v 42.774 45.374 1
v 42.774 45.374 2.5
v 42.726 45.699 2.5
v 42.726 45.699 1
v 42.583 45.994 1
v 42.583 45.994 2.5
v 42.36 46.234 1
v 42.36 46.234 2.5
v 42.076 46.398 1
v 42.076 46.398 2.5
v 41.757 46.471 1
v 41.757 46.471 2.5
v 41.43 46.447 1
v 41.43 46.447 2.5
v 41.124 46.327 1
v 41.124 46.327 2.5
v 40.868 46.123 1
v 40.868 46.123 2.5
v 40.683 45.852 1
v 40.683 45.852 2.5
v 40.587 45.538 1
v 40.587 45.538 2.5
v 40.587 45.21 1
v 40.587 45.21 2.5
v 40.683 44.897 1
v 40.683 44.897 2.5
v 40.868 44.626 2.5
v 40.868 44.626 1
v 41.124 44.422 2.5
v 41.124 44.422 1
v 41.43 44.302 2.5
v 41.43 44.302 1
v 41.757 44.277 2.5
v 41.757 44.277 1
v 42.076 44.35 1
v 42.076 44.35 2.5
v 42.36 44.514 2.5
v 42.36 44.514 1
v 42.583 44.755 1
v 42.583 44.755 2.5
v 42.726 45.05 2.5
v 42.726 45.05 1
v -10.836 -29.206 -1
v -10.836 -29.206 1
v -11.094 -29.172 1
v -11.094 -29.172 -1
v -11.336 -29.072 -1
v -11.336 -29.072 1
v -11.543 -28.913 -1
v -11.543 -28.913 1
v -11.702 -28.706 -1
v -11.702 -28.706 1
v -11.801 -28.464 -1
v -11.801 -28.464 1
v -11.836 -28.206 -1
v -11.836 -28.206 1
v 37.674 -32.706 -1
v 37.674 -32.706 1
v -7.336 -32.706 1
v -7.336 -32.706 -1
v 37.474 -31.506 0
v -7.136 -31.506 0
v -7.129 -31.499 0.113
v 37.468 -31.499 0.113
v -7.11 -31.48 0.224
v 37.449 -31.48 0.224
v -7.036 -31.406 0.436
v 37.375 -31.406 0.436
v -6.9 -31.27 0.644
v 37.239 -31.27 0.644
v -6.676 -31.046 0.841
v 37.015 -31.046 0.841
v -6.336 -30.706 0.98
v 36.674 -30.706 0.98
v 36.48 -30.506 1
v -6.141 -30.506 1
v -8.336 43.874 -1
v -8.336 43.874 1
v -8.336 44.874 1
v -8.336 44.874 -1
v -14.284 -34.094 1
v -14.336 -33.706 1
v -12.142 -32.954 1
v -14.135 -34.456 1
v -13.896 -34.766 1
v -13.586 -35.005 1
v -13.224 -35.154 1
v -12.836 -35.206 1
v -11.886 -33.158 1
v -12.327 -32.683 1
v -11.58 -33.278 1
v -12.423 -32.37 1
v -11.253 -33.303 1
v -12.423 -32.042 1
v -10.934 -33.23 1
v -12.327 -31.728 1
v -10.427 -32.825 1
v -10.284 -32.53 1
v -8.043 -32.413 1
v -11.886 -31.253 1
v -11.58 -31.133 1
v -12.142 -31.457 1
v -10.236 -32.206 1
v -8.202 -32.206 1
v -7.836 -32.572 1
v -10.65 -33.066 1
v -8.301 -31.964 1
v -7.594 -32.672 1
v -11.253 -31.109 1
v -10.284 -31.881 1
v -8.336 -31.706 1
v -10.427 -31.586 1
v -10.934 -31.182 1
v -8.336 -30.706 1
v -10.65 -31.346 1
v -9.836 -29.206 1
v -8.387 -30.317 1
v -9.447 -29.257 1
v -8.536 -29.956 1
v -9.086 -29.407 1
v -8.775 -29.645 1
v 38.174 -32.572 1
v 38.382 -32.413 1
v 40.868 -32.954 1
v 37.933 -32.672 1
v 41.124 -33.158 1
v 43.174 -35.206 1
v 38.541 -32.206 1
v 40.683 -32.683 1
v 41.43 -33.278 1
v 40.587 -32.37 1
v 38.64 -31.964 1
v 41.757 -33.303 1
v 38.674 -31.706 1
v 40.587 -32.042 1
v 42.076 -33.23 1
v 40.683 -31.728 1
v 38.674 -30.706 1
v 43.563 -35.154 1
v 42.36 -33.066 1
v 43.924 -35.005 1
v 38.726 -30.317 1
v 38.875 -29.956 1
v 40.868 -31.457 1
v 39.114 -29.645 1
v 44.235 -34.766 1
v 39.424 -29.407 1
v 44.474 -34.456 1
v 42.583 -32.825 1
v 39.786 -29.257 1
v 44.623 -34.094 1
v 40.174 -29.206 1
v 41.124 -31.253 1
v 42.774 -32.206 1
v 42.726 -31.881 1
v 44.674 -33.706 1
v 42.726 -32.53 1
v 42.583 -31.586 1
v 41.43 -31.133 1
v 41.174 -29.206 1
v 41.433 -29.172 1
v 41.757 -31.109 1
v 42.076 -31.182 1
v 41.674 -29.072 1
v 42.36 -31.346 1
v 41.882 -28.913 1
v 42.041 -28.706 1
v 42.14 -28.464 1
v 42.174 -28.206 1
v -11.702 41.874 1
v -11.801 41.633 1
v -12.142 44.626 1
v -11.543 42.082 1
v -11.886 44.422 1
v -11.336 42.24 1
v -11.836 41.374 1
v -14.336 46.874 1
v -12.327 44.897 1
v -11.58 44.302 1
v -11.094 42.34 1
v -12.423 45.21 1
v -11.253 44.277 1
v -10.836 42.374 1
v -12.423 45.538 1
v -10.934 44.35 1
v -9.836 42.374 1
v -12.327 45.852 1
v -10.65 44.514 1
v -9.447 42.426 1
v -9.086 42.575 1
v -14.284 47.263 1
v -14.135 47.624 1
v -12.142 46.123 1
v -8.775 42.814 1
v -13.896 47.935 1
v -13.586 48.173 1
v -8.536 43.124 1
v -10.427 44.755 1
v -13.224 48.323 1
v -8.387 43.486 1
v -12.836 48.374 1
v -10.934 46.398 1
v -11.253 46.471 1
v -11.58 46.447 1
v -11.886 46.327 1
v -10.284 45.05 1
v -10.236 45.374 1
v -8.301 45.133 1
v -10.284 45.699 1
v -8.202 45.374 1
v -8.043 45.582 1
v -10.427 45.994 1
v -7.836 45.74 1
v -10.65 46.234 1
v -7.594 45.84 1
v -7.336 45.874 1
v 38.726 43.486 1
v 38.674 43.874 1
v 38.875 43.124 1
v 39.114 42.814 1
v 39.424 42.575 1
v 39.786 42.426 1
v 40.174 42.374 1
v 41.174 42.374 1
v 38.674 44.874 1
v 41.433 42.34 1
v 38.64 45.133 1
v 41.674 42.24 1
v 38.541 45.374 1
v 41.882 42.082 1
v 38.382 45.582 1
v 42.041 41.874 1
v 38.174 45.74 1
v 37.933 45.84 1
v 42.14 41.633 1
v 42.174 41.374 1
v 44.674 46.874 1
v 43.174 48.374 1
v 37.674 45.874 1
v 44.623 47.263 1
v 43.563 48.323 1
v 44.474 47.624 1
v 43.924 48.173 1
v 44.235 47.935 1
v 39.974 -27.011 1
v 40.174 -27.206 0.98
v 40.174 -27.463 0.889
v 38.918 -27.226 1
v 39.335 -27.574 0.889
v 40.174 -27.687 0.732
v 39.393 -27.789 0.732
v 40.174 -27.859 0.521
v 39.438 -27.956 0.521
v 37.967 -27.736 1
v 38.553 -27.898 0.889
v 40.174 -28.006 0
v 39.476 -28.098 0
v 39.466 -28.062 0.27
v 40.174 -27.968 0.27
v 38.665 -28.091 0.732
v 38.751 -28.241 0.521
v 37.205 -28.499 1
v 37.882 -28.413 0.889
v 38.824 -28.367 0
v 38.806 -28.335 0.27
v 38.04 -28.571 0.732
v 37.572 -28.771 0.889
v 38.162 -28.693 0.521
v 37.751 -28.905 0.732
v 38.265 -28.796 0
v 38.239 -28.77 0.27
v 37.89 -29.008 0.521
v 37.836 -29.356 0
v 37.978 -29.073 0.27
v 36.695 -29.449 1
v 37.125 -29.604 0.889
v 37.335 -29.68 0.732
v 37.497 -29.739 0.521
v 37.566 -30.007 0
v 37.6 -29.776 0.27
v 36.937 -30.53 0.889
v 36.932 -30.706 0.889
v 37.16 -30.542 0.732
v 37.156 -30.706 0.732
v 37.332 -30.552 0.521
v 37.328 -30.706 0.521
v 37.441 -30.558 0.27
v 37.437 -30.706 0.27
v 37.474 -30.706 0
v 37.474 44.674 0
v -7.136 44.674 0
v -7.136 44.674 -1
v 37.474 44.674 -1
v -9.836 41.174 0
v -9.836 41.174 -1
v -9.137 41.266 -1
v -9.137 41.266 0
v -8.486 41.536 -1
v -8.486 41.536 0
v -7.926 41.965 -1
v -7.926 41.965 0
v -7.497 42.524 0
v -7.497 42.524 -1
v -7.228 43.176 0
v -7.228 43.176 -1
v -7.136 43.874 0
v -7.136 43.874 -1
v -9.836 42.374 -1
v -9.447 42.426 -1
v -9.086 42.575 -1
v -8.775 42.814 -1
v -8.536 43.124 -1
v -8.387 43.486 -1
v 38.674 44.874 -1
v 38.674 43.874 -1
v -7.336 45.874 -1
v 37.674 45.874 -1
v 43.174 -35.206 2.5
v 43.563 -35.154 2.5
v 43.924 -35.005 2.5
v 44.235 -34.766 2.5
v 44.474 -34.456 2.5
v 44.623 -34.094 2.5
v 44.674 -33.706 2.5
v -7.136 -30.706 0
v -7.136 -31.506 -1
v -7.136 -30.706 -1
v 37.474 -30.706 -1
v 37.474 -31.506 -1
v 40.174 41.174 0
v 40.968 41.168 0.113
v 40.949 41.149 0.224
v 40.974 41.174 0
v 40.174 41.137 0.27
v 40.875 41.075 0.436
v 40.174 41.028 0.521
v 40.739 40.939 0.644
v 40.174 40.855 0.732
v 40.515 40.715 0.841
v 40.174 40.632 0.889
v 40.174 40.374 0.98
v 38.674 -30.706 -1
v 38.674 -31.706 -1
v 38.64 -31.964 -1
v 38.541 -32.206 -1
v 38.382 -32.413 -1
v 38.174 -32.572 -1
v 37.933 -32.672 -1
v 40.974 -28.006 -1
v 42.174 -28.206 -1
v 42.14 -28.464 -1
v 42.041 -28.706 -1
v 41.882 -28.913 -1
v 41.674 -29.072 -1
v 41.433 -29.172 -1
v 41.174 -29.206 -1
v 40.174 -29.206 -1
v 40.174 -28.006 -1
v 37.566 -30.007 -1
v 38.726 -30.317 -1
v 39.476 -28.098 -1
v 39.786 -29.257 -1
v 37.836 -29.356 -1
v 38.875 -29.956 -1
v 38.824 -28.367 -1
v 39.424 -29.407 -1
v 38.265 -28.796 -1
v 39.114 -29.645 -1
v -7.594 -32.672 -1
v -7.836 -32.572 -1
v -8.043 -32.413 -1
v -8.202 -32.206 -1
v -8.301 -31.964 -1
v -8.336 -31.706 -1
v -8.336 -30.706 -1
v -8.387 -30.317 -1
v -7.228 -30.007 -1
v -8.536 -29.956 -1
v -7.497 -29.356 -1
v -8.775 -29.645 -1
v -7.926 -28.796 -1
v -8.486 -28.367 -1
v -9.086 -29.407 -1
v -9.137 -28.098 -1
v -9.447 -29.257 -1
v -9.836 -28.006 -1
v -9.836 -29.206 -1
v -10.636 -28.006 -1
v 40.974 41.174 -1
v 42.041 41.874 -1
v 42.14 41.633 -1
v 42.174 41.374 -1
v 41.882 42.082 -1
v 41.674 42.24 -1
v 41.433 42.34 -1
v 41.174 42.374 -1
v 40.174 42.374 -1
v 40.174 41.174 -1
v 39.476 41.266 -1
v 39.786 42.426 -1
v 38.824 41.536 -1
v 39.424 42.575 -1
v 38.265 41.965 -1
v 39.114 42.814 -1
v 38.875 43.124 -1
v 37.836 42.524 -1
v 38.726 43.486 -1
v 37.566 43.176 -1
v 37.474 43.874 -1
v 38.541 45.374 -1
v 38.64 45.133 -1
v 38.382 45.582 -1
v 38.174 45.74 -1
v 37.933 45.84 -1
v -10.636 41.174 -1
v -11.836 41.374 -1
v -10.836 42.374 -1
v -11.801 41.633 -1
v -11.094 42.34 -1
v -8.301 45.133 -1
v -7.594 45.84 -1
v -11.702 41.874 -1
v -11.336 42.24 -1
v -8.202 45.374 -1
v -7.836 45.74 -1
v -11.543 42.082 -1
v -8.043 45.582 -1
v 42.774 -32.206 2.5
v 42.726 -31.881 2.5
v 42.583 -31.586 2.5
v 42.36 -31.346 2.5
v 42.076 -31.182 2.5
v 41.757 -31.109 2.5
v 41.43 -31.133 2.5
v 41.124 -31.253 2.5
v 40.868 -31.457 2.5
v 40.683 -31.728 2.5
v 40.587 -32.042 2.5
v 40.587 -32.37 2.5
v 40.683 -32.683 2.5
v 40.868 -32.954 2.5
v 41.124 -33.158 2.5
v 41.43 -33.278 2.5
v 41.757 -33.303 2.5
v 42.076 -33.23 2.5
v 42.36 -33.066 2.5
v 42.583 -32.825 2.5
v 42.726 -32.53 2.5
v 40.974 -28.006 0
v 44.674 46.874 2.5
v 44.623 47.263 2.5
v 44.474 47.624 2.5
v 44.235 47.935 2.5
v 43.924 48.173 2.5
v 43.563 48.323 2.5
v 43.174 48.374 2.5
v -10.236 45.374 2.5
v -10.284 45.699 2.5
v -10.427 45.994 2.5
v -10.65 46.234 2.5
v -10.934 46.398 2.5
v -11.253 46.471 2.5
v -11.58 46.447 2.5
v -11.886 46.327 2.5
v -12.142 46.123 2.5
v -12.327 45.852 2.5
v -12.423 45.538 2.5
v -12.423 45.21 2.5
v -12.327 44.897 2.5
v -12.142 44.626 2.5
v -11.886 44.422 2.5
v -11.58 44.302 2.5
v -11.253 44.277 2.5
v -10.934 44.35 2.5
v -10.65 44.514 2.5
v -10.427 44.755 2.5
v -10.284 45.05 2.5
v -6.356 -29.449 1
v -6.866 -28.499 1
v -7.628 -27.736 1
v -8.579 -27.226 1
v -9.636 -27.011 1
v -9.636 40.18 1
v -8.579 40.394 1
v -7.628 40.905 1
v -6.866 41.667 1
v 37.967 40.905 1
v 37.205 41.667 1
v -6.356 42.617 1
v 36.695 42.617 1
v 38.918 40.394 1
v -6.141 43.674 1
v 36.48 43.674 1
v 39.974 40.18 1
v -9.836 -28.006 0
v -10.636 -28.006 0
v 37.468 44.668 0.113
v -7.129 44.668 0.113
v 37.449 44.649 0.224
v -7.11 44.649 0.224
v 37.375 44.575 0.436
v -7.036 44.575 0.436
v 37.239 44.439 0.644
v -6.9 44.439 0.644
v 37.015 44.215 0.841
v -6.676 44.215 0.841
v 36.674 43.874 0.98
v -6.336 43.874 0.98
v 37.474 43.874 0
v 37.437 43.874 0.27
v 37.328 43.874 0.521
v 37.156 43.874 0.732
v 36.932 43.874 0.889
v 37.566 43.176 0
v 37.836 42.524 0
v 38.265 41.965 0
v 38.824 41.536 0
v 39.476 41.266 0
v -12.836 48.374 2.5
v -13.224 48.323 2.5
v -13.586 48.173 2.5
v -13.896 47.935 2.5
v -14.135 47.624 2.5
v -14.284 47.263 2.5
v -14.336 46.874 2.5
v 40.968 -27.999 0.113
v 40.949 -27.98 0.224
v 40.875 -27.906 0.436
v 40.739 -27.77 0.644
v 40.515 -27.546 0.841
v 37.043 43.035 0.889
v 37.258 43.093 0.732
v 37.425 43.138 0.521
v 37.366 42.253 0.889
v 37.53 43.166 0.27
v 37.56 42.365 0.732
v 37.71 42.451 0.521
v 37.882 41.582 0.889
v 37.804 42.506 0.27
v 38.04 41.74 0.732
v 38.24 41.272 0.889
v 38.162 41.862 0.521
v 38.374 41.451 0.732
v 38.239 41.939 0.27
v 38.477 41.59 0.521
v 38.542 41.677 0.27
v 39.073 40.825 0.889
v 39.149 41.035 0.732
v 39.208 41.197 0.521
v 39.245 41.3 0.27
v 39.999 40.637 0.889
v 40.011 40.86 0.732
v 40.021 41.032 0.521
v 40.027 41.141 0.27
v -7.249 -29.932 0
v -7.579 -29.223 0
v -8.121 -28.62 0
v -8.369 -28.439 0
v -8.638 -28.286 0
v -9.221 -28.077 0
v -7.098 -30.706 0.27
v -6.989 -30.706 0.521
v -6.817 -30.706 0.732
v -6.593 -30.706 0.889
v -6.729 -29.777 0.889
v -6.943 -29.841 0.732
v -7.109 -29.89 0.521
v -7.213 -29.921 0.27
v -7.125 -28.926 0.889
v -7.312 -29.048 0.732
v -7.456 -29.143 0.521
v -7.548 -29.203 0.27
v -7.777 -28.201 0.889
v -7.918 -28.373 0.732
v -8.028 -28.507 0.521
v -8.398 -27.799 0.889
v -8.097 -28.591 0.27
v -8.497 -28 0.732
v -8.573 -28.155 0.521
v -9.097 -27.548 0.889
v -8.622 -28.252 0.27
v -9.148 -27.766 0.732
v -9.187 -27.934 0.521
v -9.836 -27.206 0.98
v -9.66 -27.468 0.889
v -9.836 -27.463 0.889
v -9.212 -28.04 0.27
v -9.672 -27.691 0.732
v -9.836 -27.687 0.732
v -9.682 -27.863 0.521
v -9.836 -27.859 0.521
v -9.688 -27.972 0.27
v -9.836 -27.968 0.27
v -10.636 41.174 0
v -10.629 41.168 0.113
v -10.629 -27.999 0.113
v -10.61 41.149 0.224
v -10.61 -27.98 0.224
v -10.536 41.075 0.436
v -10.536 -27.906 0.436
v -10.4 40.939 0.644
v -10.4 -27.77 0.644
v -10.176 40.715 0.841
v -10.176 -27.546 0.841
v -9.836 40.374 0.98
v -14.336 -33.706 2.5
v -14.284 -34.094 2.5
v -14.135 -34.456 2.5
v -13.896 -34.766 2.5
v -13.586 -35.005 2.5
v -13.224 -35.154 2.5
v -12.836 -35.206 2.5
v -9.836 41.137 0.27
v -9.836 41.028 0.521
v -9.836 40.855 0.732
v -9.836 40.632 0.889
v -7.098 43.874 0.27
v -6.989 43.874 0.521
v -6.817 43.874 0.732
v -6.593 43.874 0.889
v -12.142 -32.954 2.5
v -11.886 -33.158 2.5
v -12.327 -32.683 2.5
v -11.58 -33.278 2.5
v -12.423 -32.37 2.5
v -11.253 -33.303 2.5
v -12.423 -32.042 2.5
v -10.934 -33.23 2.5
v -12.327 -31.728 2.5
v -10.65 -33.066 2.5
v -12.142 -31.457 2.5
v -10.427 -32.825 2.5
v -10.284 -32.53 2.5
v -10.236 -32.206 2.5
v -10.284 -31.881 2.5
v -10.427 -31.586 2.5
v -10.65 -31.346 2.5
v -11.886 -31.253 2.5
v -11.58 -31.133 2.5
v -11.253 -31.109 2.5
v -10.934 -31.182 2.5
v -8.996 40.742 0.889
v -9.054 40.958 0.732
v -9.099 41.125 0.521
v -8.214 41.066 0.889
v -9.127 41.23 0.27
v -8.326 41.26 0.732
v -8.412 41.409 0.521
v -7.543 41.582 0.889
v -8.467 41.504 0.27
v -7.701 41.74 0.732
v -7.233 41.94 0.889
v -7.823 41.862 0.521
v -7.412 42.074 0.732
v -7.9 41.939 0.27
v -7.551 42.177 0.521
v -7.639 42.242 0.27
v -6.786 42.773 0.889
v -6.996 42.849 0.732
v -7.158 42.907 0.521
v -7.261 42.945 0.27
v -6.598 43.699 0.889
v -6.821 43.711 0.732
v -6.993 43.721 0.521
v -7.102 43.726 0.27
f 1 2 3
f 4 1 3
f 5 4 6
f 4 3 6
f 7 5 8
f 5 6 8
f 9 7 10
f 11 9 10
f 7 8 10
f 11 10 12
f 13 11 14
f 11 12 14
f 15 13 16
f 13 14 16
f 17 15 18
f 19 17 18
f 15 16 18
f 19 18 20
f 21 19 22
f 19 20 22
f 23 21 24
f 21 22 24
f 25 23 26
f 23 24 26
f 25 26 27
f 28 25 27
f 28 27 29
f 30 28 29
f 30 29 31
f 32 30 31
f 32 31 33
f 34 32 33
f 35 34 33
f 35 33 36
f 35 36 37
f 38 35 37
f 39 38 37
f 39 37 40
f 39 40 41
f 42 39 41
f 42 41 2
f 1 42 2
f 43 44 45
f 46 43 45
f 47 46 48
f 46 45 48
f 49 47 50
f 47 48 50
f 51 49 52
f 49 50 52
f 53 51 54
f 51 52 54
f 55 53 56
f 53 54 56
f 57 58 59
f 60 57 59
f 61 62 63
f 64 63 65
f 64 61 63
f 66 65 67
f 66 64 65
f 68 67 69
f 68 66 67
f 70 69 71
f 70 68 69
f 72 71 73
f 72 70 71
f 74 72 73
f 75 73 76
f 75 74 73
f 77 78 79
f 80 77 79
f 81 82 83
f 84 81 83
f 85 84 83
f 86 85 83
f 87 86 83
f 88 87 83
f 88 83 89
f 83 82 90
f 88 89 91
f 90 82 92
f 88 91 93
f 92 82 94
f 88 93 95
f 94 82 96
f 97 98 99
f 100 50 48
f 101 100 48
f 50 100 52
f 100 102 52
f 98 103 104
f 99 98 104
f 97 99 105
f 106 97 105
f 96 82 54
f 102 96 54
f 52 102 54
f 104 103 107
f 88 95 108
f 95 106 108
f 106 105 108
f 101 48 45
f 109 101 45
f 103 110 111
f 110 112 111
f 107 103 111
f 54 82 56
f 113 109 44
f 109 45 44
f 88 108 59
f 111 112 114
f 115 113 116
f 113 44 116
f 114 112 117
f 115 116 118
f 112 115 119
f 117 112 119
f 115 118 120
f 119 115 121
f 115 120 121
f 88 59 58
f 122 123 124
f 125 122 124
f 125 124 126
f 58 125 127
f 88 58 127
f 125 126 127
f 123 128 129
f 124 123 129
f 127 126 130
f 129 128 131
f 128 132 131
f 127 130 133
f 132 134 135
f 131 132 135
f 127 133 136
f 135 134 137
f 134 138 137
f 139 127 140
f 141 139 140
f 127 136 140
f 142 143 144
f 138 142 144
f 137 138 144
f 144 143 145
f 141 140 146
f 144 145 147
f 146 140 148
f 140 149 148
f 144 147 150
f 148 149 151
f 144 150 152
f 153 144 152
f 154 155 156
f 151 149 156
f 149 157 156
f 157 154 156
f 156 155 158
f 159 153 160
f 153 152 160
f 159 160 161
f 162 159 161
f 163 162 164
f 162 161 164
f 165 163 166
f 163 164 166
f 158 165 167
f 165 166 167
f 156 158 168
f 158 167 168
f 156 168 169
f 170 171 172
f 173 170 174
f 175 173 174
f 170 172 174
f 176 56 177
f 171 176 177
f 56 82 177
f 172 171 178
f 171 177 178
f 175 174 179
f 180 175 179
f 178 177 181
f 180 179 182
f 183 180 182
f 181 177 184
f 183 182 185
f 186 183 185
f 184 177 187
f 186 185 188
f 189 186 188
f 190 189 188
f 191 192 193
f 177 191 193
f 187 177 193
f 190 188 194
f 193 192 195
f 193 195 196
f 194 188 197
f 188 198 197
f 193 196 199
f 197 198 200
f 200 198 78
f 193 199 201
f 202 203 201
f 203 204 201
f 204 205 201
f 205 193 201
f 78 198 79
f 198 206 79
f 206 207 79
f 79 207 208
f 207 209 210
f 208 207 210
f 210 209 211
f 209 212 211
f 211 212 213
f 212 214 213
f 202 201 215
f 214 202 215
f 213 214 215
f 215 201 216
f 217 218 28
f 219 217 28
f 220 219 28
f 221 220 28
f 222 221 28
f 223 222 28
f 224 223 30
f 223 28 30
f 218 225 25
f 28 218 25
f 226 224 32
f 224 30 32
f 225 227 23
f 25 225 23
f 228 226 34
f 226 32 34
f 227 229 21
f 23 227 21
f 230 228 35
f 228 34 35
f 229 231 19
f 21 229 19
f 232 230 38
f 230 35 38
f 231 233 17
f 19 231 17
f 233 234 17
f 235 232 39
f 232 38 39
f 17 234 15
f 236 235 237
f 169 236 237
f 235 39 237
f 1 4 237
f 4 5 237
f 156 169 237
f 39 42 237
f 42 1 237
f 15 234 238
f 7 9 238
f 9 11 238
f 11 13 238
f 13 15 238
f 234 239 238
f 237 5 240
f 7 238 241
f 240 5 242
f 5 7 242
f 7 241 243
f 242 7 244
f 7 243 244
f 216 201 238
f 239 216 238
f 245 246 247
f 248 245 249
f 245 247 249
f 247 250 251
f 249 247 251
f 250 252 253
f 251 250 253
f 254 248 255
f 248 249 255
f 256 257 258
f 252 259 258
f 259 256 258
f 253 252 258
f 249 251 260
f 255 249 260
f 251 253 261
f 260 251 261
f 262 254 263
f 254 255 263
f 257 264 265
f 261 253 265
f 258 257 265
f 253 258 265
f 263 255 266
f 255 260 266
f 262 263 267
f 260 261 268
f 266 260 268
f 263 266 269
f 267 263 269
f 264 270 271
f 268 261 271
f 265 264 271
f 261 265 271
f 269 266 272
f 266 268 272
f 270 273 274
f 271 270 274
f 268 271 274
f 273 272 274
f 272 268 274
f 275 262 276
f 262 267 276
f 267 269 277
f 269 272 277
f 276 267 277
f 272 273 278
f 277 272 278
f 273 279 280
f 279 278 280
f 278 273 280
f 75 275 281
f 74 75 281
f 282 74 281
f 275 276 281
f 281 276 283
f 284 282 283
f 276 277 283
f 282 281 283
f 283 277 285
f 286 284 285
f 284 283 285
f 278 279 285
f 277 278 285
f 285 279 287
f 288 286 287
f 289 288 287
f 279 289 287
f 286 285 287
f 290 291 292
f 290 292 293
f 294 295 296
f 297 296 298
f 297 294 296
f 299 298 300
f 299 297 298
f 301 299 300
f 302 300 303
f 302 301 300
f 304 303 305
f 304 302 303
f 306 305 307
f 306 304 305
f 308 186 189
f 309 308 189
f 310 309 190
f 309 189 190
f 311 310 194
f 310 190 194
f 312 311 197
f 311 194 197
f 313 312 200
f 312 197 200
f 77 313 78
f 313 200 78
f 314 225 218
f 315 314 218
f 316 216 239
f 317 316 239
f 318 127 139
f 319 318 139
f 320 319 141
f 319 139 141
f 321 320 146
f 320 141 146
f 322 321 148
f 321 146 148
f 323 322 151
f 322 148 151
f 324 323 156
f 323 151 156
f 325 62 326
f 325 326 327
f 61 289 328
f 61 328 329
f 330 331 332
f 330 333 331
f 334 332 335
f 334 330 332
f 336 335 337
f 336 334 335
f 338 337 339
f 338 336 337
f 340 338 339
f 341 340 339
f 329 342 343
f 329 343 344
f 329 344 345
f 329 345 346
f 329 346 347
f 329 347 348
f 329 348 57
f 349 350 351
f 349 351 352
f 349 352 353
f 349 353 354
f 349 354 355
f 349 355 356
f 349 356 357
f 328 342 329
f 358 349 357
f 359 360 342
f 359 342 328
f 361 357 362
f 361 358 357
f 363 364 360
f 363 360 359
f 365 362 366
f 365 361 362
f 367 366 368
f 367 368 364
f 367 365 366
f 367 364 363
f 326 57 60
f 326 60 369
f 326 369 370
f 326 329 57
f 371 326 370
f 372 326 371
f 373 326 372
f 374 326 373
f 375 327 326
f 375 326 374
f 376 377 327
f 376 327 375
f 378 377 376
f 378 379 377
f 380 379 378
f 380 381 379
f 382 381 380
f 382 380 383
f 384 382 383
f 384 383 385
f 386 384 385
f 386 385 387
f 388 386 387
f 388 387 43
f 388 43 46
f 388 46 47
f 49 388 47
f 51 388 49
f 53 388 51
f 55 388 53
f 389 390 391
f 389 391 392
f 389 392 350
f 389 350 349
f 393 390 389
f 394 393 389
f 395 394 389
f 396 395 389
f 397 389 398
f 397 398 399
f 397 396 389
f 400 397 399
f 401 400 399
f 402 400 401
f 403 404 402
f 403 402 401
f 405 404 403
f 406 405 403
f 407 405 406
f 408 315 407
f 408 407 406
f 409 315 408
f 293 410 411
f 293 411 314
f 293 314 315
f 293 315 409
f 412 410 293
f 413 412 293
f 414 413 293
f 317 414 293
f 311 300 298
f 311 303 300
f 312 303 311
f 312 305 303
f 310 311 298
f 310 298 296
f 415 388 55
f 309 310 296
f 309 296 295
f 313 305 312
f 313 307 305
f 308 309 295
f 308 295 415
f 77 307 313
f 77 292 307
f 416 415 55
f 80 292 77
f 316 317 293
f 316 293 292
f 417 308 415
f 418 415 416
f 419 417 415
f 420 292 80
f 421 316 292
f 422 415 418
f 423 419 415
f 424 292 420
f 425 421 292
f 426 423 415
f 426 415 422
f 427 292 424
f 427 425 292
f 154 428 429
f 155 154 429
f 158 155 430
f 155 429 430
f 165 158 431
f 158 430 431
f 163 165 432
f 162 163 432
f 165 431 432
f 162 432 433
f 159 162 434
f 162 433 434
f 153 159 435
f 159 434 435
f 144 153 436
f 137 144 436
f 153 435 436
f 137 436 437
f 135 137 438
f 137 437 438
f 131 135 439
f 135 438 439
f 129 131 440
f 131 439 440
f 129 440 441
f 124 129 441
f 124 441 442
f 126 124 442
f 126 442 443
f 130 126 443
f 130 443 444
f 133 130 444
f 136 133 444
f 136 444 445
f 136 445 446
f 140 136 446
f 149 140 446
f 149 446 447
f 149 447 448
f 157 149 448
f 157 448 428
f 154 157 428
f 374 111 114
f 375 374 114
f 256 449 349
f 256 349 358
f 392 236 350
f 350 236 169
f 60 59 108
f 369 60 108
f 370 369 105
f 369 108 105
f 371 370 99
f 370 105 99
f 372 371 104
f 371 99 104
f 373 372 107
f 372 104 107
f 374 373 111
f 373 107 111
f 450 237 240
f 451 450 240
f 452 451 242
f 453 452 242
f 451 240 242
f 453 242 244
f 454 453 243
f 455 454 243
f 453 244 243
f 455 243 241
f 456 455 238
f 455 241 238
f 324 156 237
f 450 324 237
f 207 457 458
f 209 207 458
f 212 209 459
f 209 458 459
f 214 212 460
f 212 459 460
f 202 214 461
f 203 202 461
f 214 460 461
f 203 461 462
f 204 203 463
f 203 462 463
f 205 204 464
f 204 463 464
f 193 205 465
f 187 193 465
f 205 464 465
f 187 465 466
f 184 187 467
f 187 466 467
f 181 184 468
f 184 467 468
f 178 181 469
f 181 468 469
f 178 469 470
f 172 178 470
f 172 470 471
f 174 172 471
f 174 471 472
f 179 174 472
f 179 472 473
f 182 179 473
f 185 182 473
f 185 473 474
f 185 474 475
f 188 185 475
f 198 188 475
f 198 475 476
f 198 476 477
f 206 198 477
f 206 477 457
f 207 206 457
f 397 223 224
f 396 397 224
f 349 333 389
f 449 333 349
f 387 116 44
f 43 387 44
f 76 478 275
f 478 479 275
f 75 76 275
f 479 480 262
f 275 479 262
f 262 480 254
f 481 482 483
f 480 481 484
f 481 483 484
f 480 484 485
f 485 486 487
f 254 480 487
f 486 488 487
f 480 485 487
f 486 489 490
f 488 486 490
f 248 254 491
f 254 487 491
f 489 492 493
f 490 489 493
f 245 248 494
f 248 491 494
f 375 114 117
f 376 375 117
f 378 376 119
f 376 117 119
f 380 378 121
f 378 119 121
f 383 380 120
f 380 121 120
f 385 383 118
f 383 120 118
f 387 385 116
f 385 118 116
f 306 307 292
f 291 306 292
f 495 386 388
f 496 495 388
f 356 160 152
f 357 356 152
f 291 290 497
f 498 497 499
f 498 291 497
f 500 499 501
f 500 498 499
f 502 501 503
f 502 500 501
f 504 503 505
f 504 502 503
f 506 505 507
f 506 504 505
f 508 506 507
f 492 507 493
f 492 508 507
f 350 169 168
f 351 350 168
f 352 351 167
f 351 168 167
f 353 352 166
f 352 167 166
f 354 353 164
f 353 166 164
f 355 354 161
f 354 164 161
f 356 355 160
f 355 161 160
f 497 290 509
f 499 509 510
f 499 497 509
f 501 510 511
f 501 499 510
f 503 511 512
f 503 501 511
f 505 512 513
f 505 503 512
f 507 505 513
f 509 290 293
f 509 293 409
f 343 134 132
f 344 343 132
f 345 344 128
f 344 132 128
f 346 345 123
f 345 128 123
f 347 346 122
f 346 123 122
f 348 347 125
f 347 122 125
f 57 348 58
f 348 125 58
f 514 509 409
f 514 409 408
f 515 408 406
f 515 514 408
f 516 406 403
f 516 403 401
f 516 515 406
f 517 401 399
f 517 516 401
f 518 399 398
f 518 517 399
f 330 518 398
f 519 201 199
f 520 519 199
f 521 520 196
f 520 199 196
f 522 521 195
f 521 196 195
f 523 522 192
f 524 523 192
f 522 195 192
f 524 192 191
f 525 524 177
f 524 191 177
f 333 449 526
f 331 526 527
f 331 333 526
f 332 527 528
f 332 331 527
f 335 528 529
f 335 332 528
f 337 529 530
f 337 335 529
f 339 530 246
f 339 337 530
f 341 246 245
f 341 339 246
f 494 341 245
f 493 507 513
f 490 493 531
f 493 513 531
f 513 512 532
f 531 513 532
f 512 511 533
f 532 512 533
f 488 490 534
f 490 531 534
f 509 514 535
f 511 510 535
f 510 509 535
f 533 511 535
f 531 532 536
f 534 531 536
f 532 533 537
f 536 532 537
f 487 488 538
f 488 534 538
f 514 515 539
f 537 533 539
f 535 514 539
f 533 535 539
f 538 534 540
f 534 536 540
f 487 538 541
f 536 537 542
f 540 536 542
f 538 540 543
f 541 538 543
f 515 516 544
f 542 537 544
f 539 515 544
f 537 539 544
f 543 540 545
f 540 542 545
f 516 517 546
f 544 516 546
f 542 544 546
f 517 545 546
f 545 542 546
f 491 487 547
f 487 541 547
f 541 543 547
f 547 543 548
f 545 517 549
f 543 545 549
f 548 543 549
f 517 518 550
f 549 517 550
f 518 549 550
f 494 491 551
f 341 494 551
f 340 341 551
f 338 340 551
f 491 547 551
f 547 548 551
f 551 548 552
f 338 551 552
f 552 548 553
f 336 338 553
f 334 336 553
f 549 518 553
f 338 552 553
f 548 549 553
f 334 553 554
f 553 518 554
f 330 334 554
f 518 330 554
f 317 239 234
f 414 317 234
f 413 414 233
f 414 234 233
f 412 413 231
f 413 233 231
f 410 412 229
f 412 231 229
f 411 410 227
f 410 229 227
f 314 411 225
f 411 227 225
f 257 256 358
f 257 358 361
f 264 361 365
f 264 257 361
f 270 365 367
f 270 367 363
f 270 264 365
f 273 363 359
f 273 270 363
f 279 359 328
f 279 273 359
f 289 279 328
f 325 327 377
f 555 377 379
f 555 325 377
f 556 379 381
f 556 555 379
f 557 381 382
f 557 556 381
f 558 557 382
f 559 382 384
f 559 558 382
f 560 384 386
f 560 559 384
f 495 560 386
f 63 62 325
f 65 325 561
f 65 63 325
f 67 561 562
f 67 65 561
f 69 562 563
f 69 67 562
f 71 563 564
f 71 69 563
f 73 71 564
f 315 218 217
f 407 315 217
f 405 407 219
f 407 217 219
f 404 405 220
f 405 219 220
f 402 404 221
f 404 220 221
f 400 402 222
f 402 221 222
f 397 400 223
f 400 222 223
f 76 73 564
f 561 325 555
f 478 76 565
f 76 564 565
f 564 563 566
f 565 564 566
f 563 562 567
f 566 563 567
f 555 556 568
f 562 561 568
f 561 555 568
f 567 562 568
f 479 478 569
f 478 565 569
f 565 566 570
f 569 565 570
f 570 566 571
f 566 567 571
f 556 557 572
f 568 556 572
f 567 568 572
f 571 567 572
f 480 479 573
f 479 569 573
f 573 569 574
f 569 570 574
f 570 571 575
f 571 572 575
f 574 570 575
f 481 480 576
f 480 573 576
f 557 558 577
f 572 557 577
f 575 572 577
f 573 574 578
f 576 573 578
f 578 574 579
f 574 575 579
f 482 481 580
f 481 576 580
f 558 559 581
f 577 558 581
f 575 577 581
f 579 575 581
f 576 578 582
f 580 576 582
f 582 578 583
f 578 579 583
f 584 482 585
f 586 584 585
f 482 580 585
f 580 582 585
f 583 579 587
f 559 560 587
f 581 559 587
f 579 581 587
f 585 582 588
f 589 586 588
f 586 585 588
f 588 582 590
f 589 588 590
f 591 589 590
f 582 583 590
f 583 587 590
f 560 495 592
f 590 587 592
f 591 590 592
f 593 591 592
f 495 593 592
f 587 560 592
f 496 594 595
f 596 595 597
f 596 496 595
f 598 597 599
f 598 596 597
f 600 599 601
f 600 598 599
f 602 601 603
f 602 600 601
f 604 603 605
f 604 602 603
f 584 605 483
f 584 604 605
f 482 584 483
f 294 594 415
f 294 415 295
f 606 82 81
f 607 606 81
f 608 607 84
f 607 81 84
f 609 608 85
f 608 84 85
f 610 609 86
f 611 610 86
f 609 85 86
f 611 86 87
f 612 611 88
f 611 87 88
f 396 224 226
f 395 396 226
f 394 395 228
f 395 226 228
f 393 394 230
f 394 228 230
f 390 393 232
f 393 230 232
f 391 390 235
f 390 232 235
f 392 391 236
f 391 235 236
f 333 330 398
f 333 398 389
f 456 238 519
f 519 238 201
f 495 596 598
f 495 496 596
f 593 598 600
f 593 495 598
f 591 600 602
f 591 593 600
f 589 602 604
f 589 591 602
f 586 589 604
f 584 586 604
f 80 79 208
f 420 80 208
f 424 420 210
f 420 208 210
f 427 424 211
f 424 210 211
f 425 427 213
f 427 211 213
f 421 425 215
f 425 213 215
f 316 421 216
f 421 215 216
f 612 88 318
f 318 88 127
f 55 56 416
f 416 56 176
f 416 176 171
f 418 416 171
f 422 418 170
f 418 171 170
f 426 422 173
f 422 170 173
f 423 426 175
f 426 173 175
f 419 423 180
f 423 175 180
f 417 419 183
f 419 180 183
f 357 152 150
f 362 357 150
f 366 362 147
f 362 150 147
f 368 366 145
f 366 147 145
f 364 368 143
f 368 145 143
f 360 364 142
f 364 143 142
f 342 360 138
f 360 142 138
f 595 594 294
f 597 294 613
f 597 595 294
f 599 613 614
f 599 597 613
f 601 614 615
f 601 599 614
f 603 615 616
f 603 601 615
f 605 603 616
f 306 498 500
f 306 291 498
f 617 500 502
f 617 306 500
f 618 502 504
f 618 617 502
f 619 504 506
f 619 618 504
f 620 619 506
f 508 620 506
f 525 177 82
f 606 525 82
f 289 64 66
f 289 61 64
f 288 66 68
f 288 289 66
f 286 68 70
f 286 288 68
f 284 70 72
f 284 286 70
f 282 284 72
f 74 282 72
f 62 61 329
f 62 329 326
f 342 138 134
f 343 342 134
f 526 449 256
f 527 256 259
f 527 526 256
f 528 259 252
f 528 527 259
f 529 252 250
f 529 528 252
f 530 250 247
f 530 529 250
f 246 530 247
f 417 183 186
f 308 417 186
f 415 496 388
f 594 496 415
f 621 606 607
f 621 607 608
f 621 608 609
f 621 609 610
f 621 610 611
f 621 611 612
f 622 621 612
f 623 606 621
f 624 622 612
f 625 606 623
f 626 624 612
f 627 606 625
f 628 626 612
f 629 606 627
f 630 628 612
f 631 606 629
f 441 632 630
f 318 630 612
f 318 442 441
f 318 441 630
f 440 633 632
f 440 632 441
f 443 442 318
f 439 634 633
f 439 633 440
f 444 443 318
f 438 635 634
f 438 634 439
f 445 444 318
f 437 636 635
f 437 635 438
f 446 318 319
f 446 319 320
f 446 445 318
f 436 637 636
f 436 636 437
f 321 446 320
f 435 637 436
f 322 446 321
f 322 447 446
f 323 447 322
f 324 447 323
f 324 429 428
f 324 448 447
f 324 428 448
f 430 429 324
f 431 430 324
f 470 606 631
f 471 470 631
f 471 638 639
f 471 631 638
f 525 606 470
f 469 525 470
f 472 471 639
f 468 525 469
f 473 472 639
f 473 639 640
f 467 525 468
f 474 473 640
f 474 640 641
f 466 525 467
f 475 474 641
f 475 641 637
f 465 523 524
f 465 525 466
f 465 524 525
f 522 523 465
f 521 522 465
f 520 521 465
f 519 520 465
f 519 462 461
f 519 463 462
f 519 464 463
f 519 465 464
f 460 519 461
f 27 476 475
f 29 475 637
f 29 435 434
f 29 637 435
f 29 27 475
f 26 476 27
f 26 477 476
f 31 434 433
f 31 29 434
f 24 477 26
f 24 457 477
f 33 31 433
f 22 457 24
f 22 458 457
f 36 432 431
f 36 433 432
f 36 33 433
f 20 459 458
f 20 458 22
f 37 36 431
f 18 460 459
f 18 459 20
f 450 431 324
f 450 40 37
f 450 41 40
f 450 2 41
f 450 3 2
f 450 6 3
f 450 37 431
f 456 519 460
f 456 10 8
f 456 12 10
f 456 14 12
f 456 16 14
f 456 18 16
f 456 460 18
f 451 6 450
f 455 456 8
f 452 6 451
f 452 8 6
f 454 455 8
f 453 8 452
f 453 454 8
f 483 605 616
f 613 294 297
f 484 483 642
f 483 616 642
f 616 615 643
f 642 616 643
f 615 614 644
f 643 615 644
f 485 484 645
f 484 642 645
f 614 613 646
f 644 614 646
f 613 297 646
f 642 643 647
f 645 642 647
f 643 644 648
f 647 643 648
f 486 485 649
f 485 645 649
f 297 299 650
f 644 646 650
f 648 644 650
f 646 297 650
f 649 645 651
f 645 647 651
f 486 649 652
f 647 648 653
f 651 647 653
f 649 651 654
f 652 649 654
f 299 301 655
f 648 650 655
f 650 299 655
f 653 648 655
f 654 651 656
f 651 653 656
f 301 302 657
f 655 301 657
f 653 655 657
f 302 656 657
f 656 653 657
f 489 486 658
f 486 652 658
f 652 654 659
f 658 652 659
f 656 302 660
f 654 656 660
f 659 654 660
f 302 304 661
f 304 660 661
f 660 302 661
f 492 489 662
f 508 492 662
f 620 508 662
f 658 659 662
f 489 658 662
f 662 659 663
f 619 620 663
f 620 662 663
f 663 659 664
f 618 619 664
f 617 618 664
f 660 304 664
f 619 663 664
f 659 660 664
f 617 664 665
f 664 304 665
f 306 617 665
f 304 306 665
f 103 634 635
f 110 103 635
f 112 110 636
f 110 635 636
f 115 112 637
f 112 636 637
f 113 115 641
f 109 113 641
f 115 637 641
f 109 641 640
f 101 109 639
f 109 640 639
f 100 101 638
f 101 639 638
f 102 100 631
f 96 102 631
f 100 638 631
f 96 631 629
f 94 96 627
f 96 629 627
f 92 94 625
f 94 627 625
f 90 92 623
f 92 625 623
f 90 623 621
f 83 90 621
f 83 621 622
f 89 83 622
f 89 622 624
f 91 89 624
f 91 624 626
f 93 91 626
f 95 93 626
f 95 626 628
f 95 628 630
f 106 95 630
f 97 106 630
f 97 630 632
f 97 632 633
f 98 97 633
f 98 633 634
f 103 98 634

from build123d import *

# Parameters (mm, degrees)
LID_BASE_DEPTH = 1.5
INSERT_DEPTH   = 2
CONG_1_R       = 1
M3_HOLE_REACH  = 67.94
ESQUISSE5_R    = 1.1


with BuildPart() as part:
    # Esquisse3 → Lid_Base (new body)
    with BuildSketch(Plane.XY.offset(1)):
        with BuildLine():
            Line((-14.335501752, 46.874395923), (-14.335501752, -33.705604077))
            ThreePointArc((-14.335501752, -33.705604077), (-13.896161923, -34.766264249), (-12.835501752, -35.205604077))
            Line((-12.835501752, -35.205604077), (43.174498248, -35.205604077))
            ThreePointArc((43.174498248, -35.205604077), (44.23515842, -34.766264249), (44.674498248, -33.705604077))
            Line((44.674498248, -33.705604077), (44.674498248, 46.874395923))
            ThreePointArc((44.674498248, 46.874395923), (44.23515842, 47.935056095), (43.174498248, 48.374395923))
            Line((43.174498248, 48.374395923), (-12.835501752, 48.374395923))
            ThreePointArc((-12.835501752, 48.374395923), (-13.896161923, 47.935056095), (-14.335501752, 46.874395923))
        make_face()
    extrude(amount=LID_BASE_DEPTH)

    # Esquisse4 → Insert (add)
    with BuildSketch(Plane(origin=(0, 0, 1), x_dir=(-1, 0, 0), z_dir=(0, 0, -1))):
        with BuildLine():
            Line((7.335501752, 45.874395923), (-37.674498248, 45.874395923))
            ThreePointArc((-37.674498248, 45.874395923), (-38.38160503, 45.581502704), (-38.674498248, 44.874395923))
            Line((-38.674498248, 44.874395923), (-38.674498248, 43.874395923))
            ThreePointArc((-38.674498248, 43.874395923), (-39.113838077, 42.813735751), (-40.174498248, 42.374395923))
            Line((-40.174498248, 42.374395923), (-41.174498248, 42.374395923))
            ThreePointArc((-41.174498248, 42.374395923), (-41.88160503, 42.081502704), (-42.174498248, 41.374395923))
            Line((-42.174498248, 41.374395923), (-42.174498248, -28.205604077))
            ThreePointArc((-42.174498248, -28.205604077), (-41.88160503, -28.912710858), (-41.174498248, -29.205604077))
            Line((-41.174498248, -29.205604077), (-40.174498248, -29.205604077))
            ThreePointArc((-40.174498248, -29.205604077), (-39.113838077, -29.644943905), (-38.674498248, -30.705604077))
            Line((-38.674498248, -30.705604077), (-38.674498248, -31.705604077))
            ThreePointArc((-38.674498248, -31.705604077), (-38.38160503, -32.412710858), (-37.674498248, -32.705604077))
            Line((-37.674498248, -32.705604077), (7.335501752, -32.705604077))
            ThreePointArc((7.335501752, -32.705604077), (8.042608533, -32.412710858), (8.335501752, -31.705604077))
            Line((8.335501752, -31.705604077), (8.335501752, -30.705604077))
            ThreePointArc((8.335501752, -30.705604077), (8.77484158, -29.644943905), (9.835501752, -29.205604077))
            Line((9.835501752, -29.205604077), (10.835501752, -29.205604077))
            ThreePointArc((10.835501752, -29.205604077), (11.542608533, -28.912710858), (11.835501752, -28.205604077))
            Line((11.835501752, -28.205604077), (11.835501752, 41.374395923))
            ThreePointArc((11.835501752, 41.374395923), (11.542608533, 42.081502704), (10.835501752, 42.374395923))
            Line((10.835501752, 42.374395923), (9.835501752, 42.374395923))
            ThreePointArc((9.835501752, 42.374395923), (8.77484158, 42.813735751), (8.335501752, 43.874395923))
            Line((8.335501752, 43.874395923), (8.335501752, 44.874395923))
            ThreePointArc((8.335501752, 44.874395923), (8.042608533, 45.581502704), (7.335501752, 45.874395923))
        make_face()
        with BuildLine():
            Line((7.135501752, 44.674395923), (-37.474498248, 44.674395923))
            Line((-37.474498248, 44.674395923), (-37.474498248, 43.874395923))
            ThreePointArc((-37.474498248, 43.874395923), (-38.265309939, 41.965207614), (-40.174498248, 41.174395923))
            Line((-40.174498248, 41.174395923), (-40.974498248, 41.174395923))
            Line((-40.974498248, 41.174395923), (-40.974498248, -28.005604077))
            Line((-40.974498248, -28.005604077), (-40.174498248, -28.005604077))
            ThreePointArc((-40.174498248, -28.005604077), (-38.265309939, -28.796415768), (-37.474498248, -30.705604077))
            Line((-37.474498248, -30.705604077), (-37.474498248, -31.505604077))
            Line((-37.474498248, -31.505604077), (7.135501752, -31.505604077))
            Line((7.135501752, -31.505604077), (7.135501752, -30.705604077))
            ThreePointArc((7.135501752, -30.705604077), (7.926313442, -28.796415768), (9.835501752, -28.005604077))
            Line((9.835501752, -28.005604077), (10.635501752, -28.005604077))
            Line((10.635501752, -28.005604077), (10.635501752, 41.174395923))
            Line((10.635501752, 41.174395923), (9.835501752, 41.174395923))
            ThreePointArc((9.835501752, 41.174395923), (7.926313442, 41.965207614), (7.135501752, 43.874395923))
            Line((7.135501752, 43.874395923), (7.135501752, 44.674395923))
        make_face(mode=Mode.SUBTRACT)
    extrude(amount=INSERT_DEPTH)

    # Congé1
    # the kernel refuses this fillet: 1 mm, written as the material it adds along each edge
    with BuildSketch(Plane(origin=(-10.635501752, -28.005604077, 1), x_dir=(0, 0, -1), z_dir=(0, 1, 0)), Plane(origin=(40.974498248, 41.174395923, 1), x_dir=(0, 0, -1), z_dir=(0, -1, 0))) as cong_1_piece_1:
        with BuildLine():
            CenterArc((CONG_1_R, -CONG_1_R), CONG_1_R, 90, 90)
            Line((0, -CONG_1_R), (0, 0))
            Line((0, 0), (CONG_1_R, 0))
        make_face()
    extrude(amount=69.18)
    with BuildSketch(Plane(origin=(-9.835501752, -30.705604077, 1), x_dir=(1, 0, 0), z_dir=(0, -1, 0))) as cong_1_piece_2:
        with BuildLine():
            CenterArc((2.7 + CONG_1_R, -CONG_1_R), CONG_1_R, 90, 90)
            Line((2.7 + CONG_1_R, 0), (2.7, 0))
            Line((2.7, 0), (2.7, -CONG_1_R))
        make_face()
    revolve(axis=Axis((-9.835501752, -30.705604077, 1), (0, 0, 1)), revolution_arc=90)
    with BuildSketch(Plane(origin=(37.474498248, -31.505604077, 1), x_dir=(0, 0, -1), z_dir=(-1, 0, 0)), Plane(origin=(-7.135501752, 44.674395923, 1), x_dir=(0, 0, -1), z_dir=(1, 0, 0))) as cong_1_piece_3:
        with BuildLine():
            CenterArc((CONG_1_R, -CONG_1_R), CONG_1_R, 90, 90)
            Line((0, -CONG_1_R), (0, 0))
            Line((0, 0), (CONG_1_R, 0))
        make_face()
    extrude(amount=44.61)
    with BuildSketch(Plane(origin=(40.174498248, -30.705604077, 1), x_dir=(0, 1, 0), z_dir=(1, 0, 0))) as cong_1_piece_4:
        with BuildLine():
            CenterArc((2.7 + CONG_1_R, -CONG_1_R), CONG_1_R, 90, 90)
            Line((2.7 + CONG_1_R, 0), (2.7, 0))
            Line((2.7, 0), (2.7, -CONG_1_R))
        make_face()
    revolve(axis=Axis((40.174498248, -30.705604077, 1), (0, 0, 1)), revolution_arc=90)
    with BuildSketch(Plane(origin=(40.174498248, 43.874395923, 1), x_dir=(-1, 0, 0), z_dir=(0, 1, 0))) as cong_1_piece_5:
        with BuildLine():
            CenterArc((2.7 + CONG_1_R, -CONG_1_R), CONG_1_R, 90, 90)
            Line((2.7 + CONG_1_R, 0), (2.7, 0))
            Line((2.7, 0), (2.7, -CONG_1_R))
        make_face()
    revolve(axis=Axis((40.174498248, 43.874395923, 1), (0, 0, 1)), revolution_arc=90)
    with BuildSketch(Plane(origin=(-9.835501752, 43.874395923, 1), x_dir=(0, -1, 0), z_dir=(-1, 0, 0))) as cong_1_piece_6:
        with BuildLine():
            CenterArc((2.7 + CONG_1_R, -CONG_1_R), CONG_1_R, 90, 90)
            Line((2.7 + CONG_1_R, 0), (2.7, 0))
            Line((2.7, 0), (2.7, -CONG_1_R))
        make_face()
    revolve(axis=Axis((-9.835501752, 43.874395923, 1), (0, 0, 1)), revolution_arc=90)
    with BuildSketch(Plane(origin=(-10.635501752, 41.174395923, 1), x_dir=(0, 0, -1), z_dir=(1, 0, 0)), Plane(origin=(-7.135501752, 43.874395923, 1), x_dir=(0, 0, -1), z_dir=(0, 1, 0)), Plane(origin=(37.474498248, 44.674395923, 1), x_dir=(0, 0, -1), z_dir=(0, -1, 0)), Plane(origin=(40.174498248, 41.174395923, 1), x_dir=(0, 0, -1), z_dir=(1, 0, 0)), Plane(origin=(40.974498248, -28.005604077, 1), x_dir=(0, 0, -1), z_dir=(-1, 0, 0)), Plane(origin=(37.474498248, -30.705604077, 1), x_dir=(0, 0, -1), z_dir=(0, -1, 0)), Plane(origin=(-7.135501752, -31.505604077, 1), x_dir=(0, 0, -1), z_dir=(0, 1, 0)), Plane(origin=(-9.835501752, -28.005604077, 1), x_dir=(0, 0, -1), z_dir=(-1, 0, 0))) as cong_1_piece_7:
        with BuildLine():
            CenterArc((CONG_1_R, -CONG_1_R), CONG_1_R, 90, 90)
            Line((0, -CONG_1_R), (0, 0))
            Line((0, 0), (CONG_1_R, 0))
        make_face()
    extrude(amount=0.8)

    # Esquisse5 → M3_Hole (cut, up to next)
    with BuildSketch(Plane.XY.offset(2.5), mode=Mode.PRIVATE) as m3_hole_sk1:
        with Locations((-11.335501752, -32.205604077)):
            Circle(ESQUISSE5_R)
    m3_hole_tool1 = extrude(m3_hole_sk1.sketch, amount=-M3_HOLE_REACH, mode=Mode.PRIVATE) & part.part
    # Esquisse5 → M3_Hole (cut, up to next)
    with BuildSketch(Plane.XY.offset(2.5), mode=Mode.PRIVATE) as m3_hole_sk2:
        with Locations((-11.335501752, 45.374395923)):
            Circle(ESQUISSE5_R)
    m3_hole_tool2 = extrude(m3_hole_sk2.sketch, amount=-M3_HOLE_REACH, mode=Mode.PRIVATE) & part.part
    # Esquisse5 → M3_Hole (cut, up to next)
    with BuildSketch(Plane.XY.offset(2.5), mode=Mode.PRIVATE) as m3_hole_sk3:
        with Locations((41.674498248, 45.374395923)):
            Circle(ESQUISSE5_R)
    m3_hole_tool3 = extrude(m3_hole_sk3.sketch, amount=-M3_HOLE_REACH, mode=Mode.PRIVATE) & part.part
    # Esquisse5 → M3_Hole (cut, up to next)
    with BuildSketch(Plane.XY.offset(2.5), mode=Mode.PRIVATE) as m3_hole_sk4:
        with Locations((41.674498248, -32.205604077)):
            Circle(ESQUISSE5_R)
    m3_hole_tool4 = extrude(m3_hole_sk4.sketch, amount=-M3_HOLE_REACH, mode=Mode.PRIVATE) & part.part
    add(m3_hole_tool1.solids().sort_by_distance((-11.335502, -32.205604, 2.5))[0], mode=Mode.SUBTRACT)
    add(m3_hole_tool2.solids().sort_by_distance((-11.335502, 45.374396, 2.5))[0], mode=Mode.SUBTRACT)
    add(m3_hole_tool3.solids().sort_by_distance((41.674498, 45.374396, 2.5))[0], mode=Mode.SUBTRACT)
    add(m3_hole_tool4.solids().sort_by_distance((41.674498, -32.205604, 2.5))[0], mode=Mode.SUBTRACT)


solid = part.part
